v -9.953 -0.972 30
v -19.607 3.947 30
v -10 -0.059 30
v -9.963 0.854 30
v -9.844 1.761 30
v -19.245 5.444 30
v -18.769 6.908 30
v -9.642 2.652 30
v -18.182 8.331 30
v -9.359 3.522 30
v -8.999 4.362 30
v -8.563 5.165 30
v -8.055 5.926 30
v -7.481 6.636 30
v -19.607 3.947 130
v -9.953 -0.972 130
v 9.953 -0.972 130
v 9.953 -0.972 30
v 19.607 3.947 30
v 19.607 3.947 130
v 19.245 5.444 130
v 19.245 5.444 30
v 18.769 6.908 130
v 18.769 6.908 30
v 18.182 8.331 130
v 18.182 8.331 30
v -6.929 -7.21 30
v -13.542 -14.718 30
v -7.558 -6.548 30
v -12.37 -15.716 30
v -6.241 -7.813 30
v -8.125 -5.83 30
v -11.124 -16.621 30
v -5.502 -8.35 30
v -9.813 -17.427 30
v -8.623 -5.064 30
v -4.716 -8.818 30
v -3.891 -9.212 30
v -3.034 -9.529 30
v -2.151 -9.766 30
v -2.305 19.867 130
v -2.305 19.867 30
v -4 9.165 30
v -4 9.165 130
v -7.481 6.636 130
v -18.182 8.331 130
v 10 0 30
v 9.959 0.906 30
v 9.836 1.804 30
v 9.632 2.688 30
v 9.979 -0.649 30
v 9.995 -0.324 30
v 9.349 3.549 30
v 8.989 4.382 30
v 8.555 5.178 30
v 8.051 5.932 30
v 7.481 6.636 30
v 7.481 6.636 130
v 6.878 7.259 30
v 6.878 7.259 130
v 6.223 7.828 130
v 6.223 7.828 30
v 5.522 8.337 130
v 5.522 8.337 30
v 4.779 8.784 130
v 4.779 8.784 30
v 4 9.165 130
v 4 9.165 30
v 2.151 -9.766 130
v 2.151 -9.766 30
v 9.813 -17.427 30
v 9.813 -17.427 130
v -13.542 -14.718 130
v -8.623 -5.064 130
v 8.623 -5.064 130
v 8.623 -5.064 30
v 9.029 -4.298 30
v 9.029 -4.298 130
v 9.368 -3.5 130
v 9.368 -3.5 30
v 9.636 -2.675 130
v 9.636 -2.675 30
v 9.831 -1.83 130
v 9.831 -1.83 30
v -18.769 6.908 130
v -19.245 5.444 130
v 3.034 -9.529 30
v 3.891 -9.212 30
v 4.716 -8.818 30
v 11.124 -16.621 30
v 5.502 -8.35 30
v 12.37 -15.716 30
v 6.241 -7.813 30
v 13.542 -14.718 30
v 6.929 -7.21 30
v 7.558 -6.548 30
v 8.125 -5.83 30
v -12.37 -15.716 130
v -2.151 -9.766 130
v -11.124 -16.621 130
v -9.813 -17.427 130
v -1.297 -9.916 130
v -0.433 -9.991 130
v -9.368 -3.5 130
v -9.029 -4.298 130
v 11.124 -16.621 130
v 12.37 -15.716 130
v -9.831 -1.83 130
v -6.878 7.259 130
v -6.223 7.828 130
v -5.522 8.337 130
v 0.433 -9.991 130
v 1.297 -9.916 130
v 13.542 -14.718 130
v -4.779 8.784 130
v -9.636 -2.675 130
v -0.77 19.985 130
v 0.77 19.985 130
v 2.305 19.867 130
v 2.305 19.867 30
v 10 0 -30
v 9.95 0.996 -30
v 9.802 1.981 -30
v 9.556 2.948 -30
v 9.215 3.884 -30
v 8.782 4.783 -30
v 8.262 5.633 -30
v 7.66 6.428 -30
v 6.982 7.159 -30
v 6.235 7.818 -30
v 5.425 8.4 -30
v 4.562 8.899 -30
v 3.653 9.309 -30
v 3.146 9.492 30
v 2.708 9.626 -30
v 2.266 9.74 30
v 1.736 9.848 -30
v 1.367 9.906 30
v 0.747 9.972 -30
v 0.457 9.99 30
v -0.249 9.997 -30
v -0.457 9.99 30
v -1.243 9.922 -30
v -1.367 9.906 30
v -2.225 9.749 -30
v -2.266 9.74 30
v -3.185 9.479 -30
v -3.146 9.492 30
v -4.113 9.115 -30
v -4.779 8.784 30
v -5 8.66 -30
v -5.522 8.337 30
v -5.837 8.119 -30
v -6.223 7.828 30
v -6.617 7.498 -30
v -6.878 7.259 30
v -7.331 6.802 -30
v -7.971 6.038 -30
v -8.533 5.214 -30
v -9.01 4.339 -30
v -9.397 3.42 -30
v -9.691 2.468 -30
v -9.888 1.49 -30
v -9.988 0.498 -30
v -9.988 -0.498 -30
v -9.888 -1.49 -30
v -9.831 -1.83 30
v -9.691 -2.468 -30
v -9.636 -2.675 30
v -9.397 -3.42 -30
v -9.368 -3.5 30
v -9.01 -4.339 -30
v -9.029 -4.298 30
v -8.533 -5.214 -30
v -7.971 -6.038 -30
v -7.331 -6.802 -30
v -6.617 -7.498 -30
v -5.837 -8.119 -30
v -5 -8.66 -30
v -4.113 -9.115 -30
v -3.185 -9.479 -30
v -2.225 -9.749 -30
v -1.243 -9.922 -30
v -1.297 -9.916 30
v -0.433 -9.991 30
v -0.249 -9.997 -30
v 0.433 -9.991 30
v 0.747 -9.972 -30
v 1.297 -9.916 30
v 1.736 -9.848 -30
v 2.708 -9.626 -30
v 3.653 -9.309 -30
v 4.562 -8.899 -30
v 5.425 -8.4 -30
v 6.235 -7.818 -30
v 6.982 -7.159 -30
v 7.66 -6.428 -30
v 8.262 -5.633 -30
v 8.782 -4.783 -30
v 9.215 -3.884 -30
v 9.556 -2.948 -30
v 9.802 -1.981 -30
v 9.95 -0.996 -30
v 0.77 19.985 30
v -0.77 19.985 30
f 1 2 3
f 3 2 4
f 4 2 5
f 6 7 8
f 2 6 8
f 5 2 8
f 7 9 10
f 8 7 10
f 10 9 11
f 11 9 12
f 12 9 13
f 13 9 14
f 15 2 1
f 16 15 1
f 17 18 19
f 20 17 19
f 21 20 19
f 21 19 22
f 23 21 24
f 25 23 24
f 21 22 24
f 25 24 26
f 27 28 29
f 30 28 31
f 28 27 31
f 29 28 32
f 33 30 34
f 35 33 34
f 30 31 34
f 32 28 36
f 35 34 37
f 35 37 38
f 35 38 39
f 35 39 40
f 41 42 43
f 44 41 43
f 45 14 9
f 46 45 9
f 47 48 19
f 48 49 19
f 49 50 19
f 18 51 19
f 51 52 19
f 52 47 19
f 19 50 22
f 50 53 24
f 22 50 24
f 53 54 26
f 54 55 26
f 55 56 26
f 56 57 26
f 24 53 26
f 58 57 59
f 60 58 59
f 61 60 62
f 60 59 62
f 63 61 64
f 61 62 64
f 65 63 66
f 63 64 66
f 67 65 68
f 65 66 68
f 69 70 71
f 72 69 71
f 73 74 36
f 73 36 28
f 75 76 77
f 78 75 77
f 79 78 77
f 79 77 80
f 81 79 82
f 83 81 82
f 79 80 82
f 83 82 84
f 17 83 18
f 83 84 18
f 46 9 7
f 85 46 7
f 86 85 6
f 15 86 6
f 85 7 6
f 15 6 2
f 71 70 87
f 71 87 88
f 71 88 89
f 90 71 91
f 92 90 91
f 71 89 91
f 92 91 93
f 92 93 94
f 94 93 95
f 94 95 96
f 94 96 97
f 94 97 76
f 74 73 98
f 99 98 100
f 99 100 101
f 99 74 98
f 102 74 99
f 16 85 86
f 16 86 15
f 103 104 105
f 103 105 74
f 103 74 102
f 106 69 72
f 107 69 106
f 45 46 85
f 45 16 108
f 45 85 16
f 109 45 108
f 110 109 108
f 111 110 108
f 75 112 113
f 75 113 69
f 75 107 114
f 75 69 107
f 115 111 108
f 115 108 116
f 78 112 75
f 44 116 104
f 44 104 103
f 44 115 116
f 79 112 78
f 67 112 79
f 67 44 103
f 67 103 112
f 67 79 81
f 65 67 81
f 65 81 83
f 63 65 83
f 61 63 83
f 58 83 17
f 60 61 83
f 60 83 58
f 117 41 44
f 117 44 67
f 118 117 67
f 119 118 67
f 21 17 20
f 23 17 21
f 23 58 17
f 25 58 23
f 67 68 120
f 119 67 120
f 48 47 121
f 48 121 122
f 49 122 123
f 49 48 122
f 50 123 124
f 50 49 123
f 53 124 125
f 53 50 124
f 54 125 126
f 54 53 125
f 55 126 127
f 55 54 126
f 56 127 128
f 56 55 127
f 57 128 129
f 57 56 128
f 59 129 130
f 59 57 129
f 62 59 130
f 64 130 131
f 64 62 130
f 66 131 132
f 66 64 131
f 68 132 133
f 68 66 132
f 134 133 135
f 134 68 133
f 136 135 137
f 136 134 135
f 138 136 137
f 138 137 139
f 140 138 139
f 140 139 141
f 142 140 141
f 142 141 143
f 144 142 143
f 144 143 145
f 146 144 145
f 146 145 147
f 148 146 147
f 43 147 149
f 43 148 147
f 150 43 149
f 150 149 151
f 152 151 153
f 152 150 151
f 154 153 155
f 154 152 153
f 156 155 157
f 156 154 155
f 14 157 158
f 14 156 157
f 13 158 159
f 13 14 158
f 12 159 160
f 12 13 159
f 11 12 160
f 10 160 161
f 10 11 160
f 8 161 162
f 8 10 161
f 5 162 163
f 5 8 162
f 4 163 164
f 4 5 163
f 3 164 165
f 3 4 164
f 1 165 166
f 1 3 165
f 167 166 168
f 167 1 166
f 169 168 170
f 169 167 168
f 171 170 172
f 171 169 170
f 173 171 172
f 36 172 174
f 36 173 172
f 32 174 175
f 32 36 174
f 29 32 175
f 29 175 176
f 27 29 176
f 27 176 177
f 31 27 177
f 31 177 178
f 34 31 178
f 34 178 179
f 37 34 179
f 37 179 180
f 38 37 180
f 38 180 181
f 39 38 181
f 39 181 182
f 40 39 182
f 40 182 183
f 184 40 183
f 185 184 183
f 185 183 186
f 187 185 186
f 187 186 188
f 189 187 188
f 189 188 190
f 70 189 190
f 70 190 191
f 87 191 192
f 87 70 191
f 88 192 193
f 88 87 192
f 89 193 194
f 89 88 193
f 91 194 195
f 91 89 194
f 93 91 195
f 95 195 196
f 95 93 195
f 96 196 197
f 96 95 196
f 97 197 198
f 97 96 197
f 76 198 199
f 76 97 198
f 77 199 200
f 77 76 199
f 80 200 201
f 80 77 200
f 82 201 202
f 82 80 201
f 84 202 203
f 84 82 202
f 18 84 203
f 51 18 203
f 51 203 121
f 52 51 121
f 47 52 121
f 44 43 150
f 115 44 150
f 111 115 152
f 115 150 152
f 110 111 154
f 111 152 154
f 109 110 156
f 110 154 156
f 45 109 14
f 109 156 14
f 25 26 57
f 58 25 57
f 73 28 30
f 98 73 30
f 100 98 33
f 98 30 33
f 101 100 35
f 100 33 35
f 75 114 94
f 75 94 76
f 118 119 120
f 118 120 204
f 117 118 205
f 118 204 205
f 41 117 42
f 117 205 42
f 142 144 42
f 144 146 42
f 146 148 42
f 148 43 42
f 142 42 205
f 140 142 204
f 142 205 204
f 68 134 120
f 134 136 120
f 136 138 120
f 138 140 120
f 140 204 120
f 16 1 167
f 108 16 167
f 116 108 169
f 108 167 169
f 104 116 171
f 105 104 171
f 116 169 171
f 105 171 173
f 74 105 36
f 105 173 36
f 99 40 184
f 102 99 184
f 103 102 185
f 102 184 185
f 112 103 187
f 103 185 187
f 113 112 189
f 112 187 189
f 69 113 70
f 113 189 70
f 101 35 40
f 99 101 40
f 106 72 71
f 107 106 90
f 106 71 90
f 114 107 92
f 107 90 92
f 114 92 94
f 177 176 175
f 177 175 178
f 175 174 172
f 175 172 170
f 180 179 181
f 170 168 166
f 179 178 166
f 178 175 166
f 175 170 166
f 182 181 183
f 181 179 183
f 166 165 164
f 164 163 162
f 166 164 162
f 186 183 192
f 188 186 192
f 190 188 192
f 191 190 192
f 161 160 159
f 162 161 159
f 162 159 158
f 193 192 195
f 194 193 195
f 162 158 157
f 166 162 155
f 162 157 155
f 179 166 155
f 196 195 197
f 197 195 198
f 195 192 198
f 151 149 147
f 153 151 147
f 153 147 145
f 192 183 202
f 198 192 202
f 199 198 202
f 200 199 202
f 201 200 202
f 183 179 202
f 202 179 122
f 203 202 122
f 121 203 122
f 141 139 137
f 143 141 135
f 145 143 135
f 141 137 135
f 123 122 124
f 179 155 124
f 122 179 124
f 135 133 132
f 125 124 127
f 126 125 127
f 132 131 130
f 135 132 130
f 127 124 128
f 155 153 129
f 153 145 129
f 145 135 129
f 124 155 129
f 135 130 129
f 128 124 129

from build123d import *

# Parameters (mm, degrees)
SKETCH1_R           = 10
BOSS_EXTRUDE1_DEPTH = 30
BOSS_EXTRUDE2_DEPTH = 100


with BuildPart() as part:
    # Sketch1 → Boss-Extrude1 (new body, symmetric)
    with BuildSketch(Plane.XY):
        Circle(SKETCH1_R)
    extrude(amount=BOSS_EXTRUDE1_DEPTH, both=True)

    # Sketch2 → Boss-Extrude2 (add)
    with BuildSketch(Plane.XY.offset(30)):
        with BuildLine():
            ThreePointArc((2.305037087, 19.866726052), (0, 20), (-2.305037087, 19.866726052))
            Line((-2.305037087, 19.866726052), (-4, 9.16515139))
            ThreePointArc((-4, 9.16515139), (-5.877852523, 8.090169944), (-7.480508975, 6.636413601))
            Line((-7.480508975, 6.636413601), (-18.182083637, 8.331376514))
            ThreePointArc((-18.182083637, 8.331376514), (-19.021130326, 6.180339887), (-19.606674902, 3.946935431))
            Line((-19.606674902, 3.946935431), (-9.95264493, -0.97203853))
            ThreePointArc((-9.95264493, -0.97203853), (-9.510565163, -3.090169944), (-8.6232088, -5.063622221))
            Line((-8.6232088, -5.063622221), (-13.54218276, -14.717652193))
            ThreePointArc((-13.54218276, -14.717652193), (-11.755705046, -16.180339887), (-9.812554409, -17.427385804))
            Line((-9.812554409, -17.427385804), (-2.151072845, -9.76590424))
            ThreePointArc((-2.151072845, -9.76590424), (0, -10), (2.151072845, -9.76590424))
            Line((2.151072845, -9.76590424), (9.812554409, -17.427385804))
            ThreePointArc((9.812554409, -17.427385804), (11.755705046, -16.180339887), (13.54218276, -14.717652193))
            Line((13.54218276, -14.717652193), (8.6232088, -5.063622221))
            ThreePointArc((8.6232088, -5.063622221), (9.510565163, -3.090169944), (9.95264493, -0.97203853))
            Line((9.95264493, -0.97203853), (19.606674902, 3.946935431))
            ThreePointArc((19.606674902, 3.946935431), (19.021130326, 6.180339887), (18.182083637, 8.331376514))
            Line((18.182083637, 8.331376514), (7.480508975, 6.636413601))
            ThreePointArc((7.480508975, 6.636413601), (5.877852523, 8.090169944), (4, 9.16515139))
            Line((4, 9.16515139), (2.305037087, 19.866726052))
        make_face()
    extrude(amount=BOSS_EXTRUDE2_DEPTH)


solid = part.part
